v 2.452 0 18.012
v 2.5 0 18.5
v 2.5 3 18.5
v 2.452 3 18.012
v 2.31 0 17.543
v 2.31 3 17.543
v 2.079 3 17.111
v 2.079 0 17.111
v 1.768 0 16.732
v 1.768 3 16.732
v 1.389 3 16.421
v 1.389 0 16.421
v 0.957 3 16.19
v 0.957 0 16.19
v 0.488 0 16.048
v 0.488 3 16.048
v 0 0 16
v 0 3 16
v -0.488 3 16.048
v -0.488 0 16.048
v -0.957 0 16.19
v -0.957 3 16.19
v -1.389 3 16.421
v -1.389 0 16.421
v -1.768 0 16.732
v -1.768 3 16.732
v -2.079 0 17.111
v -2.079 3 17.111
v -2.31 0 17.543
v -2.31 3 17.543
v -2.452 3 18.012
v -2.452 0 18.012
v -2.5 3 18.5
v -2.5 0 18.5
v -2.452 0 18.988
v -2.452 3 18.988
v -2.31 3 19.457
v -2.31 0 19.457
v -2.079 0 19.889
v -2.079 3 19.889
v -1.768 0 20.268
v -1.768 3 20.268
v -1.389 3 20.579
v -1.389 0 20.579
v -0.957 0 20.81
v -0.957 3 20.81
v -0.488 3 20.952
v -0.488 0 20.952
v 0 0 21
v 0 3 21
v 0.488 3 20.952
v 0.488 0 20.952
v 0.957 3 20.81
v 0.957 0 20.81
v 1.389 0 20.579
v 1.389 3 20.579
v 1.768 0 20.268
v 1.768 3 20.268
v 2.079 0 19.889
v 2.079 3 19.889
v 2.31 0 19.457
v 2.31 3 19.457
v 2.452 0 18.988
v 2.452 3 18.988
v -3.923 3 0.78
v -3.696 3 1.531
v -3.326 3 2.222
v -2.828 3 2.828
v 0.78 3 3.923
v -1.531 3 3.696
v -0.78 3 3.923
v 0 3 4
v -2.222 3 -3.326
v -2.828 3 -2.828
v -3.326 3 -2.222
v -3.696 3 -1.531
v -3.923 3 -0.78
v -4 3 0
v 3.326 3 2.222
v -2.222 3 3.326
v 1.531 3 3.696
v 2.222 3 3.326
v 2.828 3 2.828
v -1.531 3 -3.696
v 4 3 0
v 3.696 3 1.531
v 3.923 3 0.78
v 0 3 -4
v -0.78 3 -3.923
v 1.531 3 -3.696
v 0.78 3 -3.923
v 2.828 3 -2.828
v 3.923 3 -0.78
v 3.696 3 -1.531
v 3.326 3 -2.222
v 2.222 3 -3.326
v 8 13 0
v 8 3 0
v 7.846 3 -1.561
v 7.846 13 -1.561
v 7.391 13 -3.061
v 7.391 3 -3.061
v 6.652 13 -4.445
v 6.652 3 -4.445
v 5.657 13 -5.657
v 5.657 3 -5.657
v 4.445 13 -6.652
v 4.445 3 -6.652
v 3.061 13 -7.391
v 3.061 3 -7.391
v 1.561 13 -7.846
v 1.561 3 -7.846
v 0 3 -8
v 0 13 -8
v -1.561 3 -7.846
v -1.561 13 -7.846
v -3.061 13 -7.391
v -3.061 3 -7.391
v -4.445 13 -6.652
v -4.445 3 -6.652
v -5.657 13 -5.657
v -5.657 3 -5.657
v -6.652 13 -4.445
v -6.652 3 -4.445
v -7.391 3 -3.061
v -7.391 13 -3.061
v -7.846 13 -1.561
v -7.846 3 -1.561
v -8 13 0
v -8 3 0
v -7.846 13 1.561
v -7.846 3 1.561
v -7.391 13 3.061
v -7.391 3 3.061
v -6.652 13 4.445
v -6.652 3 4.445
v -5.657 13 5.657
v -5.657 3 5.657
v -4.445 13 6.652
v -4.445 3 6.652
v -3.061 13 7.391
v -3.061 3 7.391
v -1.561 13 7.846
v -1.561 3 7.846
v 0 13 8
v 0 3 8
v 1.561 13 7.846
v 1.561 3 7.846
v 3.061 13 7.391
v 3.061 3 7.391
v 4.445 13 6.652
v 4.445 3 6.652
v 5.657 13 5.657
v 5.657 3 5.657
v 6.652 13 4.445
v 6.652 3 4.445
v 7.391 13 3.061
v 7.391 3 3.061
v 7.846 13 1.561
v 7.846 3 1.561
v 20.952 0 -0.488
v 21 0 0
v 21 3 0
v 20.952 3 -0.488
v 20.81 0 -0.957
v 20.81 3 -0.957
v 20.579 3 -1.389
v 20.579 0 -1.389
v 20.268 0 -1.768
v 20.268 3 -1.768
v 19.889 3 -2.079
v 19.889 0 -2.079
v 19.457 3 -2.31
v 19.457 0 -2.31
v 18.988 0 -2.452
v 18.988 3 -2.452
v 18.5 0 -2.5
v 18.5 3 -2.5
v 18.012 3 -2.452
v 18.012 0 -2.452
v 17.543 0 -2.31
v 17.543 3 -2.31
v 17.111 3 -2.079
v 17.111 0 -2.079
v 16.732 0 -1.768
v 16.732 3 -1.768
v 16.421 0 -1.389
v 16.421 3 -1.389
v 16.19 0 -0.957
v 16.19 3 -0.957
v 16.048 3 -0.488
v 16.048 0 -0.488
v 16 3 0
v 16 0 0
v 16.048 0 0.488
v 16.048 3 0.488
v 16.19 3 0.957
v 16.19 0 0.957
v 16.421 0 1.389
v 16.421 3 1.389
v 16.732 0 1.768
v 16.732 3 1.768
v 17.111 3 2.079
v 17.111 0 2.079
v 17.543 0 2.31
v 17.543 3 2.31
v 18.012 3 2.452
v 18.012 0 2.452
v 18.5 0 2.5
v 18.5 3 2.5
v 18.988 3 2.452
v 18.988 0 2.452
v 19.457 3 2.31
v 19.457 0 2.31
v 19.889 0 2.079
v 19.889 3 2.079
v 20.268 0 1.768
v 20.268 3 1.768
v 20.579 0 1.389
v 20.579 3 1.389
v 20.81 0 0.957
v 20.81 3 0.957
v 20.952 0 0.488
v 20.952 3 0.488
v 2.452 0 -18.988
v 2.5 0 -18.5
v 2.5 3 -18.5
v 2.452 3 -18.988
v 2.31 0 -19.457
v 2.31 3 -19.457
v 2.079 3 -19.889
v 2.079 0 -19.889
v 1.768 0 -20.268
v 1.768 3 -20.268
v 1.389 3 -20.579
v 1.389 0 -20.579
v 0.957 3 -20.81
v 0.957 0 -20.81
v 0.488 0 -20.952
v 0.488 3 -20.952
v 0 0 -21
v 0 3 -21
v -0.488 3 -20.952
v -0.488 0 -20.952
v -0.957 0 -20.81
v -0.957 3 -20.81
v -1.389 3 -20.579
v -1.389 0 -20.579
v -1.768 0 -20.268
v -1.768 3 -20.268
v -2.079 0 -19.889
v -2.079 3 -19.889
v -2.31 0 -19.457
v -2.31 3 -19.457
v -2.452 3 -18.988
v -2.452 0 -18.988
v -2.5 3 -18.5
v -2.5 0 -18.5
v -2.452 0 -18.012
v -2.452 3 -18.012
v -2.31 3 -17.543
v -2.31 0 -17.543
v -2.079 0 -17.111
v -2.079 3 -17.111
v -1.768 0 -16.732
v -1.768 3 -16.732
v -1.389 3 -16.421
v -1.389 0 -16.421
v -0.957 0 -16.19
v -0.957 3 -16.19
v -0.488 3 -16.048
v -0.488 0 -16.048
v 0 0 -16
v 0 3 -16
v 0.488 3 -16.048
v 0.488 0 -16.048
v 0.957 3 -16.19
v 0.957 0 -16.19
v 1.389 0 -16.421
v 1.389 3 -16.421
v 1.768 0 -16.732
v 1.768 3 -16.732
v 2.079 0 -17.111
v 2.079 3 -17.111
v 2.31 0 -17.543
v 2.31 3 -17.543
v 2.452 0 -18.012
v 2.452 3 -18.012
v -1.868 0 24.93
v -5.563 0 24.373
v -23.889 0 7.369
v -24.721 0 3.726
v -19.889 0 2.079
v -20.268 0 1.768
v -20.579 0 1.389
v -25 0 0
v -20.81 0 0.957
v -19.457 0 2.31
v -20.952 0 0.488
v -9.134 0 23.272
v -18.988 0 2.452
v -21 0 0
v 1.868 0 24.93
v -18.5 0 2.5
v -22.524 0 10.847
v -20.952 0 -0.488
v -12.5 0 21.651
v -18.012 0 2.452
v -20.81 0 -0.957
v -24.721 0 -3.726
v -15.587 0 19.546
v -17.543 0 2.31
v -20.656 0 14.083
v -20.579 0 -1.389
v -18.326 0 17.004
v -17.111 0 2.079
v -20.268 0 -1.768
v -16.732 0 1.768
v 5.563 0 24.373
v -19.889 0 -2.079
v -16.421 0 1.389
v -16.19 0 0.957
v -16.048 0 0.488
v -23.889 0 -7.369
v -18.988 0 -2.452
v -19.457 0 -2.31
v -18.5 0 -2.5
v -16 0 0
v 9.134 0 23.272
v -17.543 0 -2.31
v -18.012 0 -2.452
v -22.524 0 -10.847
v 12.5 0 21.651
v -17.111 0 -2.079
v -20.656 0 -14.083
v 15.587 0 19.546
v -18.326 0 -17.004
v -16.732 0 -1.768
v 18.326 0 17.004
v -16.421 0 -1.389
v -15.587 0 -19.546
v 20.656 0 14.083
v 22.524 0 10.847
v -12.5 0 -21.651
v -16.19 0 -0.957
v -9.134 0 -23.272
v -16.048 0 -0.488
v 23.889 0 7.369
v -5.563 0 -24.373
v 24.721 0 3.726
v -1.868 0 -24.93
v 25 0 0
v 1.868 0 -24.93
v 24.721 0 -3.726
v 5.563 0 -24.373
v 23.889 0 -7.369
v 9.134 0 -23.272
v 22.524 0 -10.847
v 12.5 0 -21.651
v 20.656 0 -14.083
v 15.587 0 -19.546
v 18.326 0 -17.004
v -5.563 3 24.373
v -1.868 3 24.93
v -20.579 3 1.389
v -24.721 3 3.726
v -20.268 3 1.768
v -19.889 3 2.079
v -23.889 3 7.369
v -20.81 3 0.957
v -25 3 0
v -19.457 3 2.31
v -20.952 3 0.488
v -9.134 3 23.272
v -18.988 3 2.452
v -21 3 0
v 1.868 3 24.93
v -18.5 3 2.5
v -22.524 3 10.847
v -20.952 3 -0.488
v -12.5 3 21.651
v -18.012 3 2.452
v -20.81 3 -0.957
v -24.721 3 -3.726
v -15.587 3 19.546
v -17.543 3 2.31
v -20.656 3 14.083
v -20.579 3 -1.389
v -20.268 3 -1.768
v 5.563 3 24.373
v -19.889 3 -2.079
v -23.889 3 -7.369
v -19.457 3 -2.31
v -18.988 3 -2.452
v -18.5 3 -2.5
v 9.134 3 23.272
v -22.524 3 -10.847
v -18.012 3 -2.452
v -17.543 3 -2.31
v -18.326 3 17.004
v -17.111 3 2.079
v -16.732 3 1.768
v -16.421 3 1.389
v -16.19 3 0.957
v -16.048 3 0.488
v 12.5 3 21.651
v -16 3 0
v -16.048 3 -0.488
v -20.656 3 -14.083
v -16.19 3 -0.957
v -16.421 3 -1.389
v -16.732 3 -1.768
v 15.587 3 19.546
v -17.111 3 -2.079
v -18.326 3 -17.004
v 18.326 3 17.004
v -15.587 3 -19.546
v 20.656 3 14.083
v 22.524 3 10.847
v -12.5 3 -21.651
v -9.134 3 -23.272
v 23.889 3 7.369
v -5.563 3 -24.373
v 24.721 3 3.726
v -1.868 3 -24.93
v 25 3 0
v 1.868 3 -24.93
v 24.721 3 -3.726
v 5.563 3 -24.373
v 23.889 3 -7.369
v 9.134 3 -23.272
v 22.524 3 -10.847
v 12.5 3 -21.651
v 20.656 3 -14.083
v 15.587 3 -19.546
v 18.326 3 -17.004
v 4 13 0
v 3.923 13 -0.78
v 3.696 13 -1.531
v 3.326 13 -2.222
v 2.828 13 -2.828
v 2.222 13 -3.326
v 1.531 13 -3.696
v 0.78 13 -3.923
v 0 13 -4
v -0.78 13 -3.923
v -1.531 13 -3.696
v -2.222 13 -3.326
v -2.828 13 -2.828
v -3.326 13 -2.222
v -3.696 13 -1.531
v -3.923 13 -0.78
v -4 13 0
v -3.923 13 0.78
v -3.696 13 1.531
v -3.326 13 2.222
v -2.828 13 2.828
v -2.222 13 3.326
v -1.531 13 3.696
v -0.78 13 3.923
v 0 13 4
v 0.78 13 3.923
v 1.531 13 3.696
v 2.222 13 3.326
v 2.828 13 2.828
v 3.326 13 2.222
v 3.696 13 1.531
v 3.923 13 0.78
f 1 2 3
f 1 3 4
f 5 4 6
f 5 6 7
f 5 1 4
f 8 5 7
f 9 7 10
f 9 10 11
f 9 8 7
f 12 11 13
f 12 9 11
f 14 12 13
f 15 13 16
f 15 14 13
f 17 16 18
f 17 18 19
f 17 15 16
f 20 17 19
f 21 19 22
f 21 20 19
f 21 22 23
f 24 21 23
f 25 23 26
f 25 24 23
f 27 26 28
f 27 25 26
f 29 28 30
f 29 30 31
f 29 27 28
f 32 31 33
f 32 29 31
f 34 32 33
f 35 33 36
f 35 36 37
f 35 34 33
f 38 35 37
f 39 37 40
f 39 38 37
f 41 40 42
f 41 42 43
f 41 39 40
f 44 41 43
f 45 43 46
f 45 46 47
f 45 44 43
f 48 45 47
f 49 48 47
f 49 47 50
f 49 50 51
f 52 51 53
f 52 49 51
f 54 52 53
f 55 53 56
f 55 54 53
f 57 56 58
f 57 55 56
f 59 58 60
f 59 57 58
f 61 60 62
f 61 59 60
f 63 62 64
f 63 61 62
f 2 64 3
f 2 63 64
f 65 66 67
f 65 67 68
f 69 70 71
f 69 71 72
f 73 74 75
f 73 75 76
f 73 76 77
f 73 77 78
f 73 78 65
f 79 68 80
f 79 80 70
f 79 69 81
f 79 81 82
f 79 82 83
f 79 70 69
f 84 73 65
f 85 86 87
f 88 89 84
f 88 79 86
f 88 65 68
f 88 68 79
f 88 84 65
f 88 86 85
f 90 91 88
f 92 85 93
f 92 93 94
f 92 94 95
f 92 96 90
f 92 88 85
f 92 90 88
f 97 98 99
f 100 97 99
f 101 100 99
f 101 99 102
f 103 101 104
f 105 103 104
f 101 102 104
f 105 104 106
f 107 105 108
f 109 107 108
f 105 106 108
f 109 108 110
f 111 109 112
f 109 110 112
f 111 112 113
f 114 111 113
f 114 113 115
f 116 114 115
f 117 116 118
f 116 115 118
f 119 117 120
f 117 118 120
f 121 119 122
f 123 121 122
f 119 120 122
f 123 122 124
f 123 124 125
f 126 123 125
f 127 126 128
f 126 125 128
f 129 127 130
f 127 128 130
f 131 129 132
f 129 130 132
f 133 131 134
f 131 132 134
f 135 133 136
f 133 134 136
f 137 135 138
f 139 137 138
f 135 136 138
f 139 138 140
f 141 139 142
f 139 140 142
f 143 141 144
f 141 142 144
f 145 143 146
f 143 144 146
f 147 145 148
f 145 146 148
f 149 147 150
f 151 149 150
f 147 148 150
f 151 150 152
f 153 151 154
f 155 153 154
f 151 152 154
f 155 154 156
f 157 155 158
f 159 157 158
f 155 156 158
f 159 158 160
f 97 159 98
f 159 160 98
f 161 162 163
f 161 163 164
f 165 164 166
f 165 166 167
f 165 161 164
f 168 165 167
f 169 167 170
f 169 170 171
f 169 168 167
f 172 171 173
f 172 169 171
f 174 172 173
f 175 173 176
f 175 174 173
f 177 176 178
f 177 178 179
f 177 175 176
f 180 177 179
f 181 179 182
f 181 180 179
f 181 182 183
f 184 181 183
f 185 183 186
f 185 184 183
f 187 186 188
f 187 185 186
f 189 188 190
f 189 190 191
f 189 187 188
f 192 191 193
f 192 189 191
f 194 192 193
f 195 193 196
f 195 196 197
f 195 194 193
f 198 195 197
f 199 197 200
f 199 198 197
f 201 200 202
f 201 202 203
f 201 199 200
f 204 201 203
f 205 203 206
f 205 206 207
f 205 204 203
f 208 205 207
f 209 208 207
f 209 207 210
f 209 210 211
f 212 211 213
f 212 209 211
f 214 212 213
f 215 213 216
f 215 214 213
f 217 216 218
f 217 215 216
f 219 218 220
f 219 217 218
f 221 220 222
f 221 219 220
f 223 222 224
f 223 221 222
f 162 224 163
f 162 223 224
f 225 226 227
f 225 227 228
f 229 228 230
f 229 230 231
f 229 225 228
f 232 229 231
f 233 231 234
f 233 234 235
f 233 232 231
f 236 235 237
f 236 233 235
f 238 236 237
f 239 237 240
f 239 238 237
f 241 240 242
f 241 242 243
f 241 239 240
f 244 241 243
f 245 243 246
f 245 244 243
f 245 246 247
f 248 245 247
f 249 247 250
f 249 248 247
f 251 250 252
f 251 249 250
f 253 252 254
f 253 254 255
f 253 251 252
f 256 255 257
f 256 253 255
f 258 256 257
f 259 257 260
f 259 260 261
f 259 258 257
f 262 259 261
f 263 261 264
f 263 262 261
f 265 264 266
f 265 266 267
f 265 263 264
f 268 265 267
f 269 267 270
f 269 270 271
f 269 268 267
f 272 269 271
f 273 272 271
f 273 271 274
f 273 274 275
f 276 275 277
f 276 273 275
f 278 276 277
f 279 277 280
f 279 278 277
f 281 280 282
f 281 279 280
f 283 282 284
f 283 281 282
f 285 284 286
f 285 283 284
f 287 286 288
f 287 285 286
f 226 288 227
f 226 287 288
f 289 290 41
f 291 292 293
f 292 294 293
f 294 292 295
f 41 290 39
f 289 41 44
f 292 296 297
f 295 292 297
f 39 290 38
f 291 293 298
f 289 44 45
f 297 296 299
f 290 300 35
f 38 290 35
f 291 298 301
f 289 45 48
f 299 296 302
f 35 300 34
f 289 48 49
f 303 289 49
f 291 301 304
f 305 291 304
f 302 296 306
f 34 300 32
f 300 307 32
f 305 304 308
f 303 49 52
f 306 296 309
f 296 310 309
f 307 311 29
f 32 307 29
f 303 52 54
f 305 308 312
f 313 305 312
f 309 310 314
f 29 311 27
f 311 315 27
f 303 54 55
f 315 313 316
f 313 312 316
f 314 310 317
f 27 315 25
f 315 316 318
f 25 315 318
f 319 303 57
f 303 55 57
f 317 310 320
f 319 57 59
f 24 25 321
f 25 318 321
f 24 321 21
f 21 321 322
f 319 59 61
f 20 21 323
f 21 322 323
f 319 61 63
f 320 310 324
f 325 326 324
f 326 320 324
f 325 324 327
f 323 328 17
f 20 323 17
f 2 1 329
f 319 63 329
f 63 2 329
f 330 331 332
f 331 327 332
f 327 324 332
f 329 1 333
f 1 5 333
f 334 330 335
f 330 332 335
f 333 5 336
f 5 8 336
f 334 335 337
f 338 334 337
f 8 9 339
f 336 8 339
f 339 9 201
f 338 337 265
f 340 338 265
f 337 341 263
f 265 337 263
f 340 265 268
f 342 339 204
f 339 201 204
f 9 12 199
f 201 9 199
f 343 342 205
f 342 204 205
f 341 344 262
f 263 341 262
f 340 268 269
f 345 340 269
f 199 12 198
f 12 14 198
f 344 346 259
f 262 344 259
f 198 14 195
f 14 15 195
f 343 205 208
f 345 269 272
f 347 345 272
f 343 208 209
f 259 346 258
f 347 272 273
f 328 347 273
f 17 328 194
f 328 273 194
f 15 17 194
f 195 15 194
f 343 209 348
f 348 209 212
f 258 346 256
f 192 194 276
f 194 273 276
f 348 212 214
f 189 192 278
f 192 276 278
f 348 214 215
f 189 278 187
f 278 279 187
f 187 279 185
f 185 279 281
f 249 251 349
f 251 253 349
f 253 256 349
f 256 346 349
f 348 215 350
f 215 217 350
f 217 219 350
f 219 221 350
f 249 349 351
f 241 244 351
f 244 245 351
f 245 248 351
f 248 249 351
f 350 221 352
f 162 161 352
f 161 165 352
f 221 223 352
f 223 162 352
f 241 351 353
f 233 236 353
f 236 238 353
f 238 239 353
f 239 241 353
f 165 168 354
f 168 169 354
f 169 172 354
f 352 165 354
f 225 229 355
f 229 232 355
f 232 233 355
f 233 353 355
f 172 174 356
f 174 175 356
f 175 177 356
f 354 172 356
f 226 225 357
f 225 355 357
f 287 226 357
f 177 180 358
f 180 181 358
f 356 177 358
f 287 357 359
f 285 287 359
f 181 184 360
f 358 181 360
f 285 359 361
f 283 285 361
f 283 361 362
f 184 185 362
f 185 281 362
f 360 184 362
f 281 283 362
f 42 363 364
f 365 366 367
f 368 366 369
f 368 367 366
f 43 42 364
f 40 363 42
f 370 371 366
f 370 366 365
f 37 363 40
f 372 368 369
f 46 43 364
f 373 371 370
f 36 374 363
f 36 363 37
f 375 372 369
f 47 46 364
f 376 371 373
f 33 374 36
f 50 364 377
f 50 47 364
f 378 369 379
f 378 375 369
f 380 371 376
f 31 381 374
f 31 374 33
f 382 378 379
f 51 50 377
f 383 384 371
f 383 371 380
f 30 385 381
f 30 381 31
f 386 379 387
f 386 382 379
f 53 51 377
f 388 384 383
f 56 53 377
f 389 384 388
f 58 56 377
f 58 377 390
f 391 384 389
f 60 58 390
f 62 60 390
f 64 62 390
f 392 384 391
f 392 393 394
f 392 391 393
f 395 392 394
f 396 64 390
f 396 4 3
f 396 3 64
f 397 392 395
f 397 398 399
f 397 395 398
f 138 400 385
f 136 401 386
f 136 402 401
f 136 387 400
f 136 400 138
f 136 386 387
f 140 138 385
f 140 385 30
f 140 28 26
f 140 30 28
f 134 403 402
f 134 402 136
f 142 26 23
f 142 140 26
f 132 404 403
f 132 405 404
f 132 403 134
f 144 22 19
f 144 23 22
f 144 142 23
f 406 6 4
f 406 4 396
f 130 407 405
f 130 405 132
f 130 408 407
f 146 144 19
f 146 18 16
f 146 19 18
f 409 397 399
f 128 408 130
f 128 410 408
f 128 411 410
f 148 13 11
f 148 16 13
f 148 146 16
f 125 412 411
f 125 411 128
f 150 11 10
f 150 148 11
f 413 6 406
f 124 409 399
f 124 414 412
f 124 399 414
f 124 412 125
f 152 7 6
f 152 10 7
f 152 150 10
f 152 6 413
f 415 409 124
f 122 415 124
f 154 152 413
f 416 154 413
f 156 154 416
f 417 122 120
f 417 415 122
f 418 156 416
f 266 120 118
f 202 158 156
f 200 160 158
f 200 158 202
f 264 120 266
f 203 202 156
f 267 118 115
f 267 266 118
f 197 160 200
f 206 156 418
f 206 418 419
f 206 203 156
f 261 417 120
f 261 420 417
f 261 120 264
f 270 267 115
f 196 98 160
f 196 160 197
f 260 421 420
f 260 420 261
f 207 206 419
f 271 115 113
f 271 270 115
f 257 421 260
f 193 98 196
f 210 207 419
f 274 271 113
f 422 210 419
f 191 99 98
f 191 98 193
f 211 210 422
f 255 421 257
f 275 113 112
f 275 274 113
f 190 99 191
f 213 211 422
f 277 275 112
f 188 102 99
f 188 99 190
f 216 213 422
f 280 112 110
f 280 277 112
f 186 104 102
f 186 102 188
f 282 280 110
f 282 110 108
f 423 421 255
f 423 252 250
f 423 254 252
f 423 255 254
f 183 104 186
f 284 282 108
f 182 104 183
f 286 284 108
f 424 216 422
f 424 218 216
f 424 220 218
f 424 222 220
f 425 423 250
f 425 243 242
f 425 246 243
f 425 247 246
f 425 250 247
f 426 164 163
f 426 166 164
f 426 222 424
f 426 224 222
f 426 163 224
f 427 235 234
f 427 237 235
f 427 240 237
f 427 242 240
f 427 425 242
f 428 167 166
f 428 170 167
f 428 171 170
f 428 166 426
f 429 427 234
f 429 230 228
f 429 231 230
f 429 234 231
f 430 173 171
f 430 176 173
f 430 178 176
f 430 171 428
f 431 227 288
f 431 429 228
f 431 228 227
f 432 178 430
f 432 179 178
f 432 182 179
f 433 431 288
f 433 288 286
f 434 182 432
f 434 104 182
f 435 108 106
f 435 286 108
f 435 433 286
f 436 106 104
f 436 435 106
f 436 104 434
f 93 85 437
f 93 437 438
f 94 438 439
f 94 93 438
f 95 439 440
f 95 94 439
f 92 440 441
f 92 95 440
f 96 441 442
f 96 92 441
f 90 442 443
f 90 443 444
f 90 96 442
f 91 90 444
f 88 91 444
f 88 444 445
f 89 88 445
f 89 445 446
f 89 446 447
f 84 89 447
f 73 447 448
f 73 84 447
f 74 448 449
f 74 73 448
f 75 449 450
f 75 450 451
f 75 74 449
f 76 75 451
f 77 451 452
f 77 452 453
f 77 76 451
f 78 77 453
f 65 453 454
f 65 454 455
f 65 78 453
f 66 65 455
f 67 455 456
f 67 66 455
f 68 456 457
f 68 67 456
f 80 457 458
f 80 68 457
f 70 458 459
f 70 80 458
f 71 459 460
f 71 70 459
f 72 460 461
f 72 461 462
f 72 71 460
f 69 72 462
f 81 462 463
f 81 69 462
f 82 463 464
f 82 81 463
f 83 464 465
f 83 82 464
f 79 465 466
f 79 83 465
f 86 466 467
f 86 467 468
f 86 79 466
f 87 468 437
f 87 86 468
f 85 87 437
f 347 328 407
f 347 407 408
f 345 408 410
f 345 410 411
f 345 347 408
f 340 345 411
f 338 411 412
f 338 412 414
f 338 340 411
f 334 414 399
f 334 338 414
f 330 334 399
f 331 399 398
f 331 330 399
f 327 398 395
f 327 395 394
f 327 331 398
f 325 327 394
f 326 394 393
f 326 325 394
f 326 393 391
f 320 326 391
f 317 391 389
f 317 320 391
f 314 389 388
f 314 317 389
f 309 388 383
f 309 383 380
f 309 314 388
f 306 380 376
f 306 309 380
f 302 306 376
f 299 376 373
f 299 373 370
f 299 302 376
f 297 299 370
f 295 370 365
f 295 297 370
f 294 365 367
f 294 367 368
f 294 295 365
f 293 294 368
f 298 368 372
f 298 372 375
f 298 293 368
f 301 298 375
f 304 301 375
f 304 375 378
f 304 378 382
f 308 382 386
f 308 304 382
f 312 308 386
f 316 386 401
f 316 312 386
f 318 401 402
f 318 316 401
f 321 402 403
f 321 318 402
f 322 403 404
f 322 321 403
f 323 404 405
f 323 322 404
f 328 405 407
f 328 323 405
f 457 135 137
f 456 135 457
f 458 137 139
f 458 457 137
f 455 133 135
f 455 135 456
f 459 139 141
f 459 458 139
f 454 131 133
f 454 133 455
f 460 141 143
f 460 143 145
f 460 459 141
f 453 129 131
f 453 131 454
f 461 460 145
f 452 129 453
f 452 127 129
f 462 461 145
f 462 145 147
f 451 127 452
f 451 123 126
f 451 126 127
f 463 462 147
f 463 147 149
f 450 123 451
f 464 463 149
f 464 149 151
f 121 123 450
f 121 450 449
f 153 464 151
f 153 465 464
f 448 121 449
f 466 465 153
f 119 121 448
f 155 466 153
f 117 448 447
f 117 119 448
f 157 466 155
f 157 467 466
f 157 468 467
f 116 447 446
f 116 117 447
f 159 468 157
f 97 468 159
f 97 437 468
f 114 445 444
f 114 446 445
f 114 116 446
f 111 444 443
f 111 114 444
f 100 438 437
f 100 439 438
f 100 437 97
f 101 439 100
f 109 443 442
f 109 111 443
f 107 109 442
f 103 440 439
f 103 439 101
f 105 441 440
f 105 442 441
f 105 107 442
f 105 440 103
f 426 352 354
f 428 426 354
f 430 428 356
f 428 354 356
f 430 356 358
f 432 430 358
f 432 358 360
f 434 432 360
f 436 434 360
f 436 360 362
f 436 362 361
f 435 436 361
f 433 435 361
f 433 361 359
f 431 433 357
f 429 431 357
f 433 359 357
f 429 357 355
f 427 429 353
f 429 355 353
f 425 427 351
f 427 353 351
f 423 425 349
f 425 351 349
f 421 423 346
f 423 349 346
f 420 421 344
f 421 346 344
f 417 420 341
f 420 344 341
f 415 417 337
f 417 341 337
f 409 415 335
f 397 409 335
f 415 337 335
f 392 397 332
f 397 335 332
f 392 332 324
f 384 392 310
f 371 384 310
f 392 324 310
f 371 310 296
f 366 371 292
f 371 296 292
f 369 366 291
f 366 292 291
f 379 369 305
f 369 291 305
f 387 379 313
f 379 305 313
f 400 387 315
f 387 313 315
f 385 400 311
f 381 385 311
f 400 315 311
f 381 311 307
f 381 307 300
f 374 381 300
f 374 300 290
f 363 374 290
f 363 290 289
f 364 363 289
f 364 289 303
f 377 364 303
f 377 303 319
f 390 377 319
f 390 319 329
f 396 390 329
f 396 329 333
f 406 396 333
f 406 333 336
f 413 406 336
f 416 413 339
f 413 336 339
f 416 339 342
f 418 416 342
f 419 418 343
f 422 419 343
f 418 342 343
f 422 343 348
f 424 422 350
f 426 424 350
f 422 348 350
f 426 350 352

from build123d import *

# Parameters (mm, degrees)
SKETCH2_R           = 25
SKETCH2_R_2         = 2.5
BOSS_EXTRUDE1_DEPTH = 3
SKETCH3_R           = 8
SKETCH3_R_2         = 4
BOSS_EXTRUDE2_DEPTH = 10


with BuildPart() as part:
    # Sketch2 → Boss-Extrude1 (new body)
    with BuildSketch(Plane(origin=(0, 0, 0), x_dir=(1, 0, 0), z_dir=(0, 1, 0))):
        Circle(SKETCH2_R)
        with Locations((-18.5, 0)):
            Circle(SKETCH2_R_2, mode=Mode.SUBTRACT)
        with Locations((0, 18.5)):
            Circle(SKETCH2_R_2, mode=Mode.SUBTRACT)
        with Locations((18.5, 0)):
            Circle(SKETCH2_R_2, mode=Mode.SUBTRACT)
        with Locations((0, -18.5)):
            Circle(SKETCH2_R_2, mode=Mode.SUBTRACT)
    extrude(amount=BOSS_EXTRUDE1_DEPTH)

    # Sketch3 → Boss-Extrude2 (add)
    with BuildSketch(Plane(origin=(0, 3, 0), x_dir=(1, 0, 0), z_dir=(0, 1, 0))):
        Circle(SKETCH3_R)
        Circle(SKETCH3_R_2, mode=Mode.SUBTRACT)
    extrude(amount=BOSS_EXTRUDE2_DEPTH)


solid = part.part
